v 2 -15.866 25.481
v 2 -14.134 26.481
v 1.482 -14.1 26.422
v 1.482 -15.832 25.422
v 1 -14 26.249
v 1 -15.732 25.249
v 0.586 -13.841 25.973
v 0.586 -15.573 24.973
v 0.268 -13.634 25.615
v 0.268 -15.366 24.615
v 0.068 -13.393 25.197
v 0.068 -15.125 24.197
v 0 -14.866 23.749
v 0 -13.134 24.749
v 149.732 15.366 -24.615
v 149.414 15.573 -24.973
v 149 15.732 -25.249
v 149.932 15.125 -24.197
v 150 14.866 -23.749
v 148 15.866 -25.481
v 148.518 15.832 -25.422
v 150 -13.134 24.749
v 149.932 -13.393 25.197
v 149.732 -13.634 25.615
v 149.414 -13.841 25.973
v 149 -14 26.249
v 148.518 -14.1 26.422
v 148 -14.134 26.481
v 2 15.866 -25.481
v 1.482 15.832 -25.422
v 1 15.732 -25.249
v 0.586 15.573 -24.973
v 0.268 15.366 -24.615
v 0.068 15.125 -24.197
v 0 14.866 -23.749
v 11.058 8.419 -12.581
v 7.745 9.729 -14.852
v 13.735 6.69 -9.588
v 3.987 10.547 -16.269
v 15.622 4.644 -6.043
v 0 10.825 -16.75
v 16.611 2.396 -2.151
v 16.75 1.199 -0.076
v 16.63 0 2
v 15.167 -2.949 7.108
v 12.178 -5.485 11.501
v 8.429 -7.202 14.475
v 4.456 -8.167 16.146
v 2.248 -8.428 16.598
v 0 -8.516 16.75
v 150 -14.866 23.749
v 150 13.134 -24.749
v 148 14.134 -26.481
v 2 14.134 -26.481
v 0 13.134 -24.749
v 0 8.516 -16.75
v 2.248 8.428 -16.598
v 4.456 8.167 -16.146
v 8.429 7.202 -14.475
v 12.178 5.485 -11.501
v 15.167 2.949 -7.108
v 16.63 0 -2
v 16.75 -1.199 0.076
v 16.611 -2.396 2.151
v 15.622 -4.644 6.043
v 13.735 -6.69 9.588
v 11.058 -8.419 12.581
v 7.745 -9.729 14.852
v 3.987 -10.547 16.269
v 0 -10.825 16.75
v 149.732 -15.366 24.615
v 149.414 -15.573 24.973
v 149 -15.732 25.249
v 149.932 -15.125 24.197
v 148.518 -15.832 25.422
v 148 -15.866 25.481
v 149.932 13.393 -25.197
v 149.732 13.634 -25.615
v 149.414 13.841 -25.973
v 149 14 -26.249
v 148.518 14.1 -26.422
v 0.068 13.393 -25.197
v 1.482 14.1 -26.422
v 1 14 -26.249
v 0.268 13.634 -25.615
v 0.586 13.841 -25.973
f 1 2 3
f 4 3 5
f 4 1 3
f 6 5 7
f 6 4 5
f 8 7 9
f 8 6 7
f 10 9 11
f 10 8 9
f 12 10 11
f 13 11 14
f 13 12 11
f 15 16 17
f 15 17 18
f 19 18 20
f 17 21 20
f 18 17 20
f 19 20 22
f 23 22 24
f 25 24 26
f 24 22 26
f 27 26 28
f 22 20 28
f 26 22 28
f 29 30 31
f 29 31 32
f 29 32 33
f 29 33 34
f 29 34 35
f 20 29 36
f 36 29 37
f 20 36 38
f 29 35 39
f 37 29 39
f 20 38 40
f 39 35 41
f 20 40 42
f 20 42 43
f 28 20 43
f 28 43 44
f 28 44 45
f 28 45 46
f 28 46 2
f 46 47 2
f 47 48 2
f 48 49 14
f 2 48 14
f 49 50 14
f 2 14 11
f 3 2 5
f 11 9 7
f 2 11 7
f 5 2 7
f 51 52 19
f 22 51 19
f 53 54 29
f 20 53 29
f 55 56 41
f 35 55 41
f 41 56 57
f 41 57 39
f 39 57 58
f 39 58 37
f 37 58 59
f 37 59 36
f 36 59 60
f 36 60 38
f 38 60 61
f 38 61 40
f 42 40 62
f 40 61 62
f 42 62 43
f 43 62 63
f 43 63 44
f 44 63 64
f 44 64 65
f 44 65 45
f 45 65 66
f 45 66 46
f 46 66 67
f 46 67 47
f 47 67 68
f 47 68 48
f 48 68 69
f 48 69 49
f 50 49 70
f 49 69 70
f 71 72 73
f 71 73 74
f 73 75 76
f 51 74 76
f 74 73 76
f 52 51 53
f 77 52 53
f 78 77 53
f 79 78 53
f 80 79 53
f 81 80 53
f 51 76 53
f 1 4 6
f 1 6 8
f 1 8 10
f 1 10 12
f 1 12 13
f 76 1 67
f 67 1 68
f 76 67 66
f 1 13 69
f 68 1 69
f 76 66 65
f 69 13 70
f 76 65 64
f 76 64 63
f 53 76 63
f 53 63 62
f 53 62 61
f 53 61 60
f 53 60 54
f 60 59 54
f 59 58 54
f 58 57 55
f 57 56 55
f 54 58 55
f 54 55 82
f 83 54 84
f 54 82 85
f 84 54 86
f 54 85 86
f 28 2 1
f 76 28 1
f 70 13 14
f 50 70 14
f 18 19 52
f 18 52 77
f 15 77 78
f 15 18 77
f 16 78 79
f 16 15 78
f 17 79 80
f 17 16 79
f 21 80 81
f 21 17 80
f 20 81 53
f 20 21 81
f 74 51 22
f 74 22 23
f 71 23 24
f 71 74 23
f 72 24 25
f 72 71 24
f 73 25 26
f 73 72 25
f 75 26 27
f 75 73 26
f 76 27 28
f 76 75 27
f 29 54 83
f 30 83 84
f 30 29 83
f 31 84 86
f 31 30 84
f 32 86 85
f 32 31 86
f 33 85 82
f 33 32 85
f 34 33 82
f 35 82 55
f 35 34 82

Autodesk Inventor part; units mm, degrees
ref_plane "YZ Plane" through (0, 0, 0) normal (1, 0, 0) x (0, 1, 0)
ref_plane "XZ Plane" through (0, 0, 0) normal (0, 1, 0) x (-1, 0, 0)
ref_plane "XY Plane" through (0, 0, 0) normal (0, 0, 1) x (1, 0, 0)
sketch "Sketch1" plane through (0, 0, 0) normal (1, 0, 0) x (0, 1, 0)
  line L0 (-15.866, 25.4808) -> (14.134, -26.4808)
  line L1 (14.134, -26.4808) -> (15.866, -25.4808)
  line L2 (15.866, -25.4808) -> (-14.134, 26.4808)
  line L3 (-14.134, 26.4808) -> (-15.866, 25.4808)
  line L4 (-15.866, 25.4808) -> (15.866, -25.4808) construction
  line L5 (14.134, -26.4808) -> (-14.134, 26.4808) construction
  line L6 (-15.866, 25.4808) -> (44.134, 25.4808) construction
  point P0 (0, 0)
  dimension "d0" = 60
  dimension "d1" = 60
  dimension "d2" = 2
extrude "Extrusion1" add sketch "Sketch1" along normal blind 150
sketch "Sketch2" plane through (0, 0, 0) normal (0, 1, 0) x (-1, 0, 0)
  circle A0 centre (0, 0) radius 16.75
  dimension "d5" = 33.5
extrude "Extrusion2" cut sketch "Sketch2" along normal through all both and the other way through all
fillet "Fillet1" radius 2 4 edges at (150, -15, 25.9808) (150, 15, -25.9808) (0, -15, 25.9808) (0, 15, -25.9808)
equation "\"BendRadius\" = Thickness"
equation "\"BendReliefWidth\" = Thickness"
equation "\"BendReliefDepth\" = 0.5 * Thickness"
equation "\"CornerReliefSize\" = 4 * Thickness"
equation "\"MinimumRemnant\" = 2 * Thickness"
equation "\"TransitionRadius\" = BendRadius"
equation "\"JacobiRadiusSize\" = BendRadius"
equation "\"GapSize\" = Thickness"
equation "\"Thickness\" = 2"
properties part number "лопасть" material "Stainless Steel"
